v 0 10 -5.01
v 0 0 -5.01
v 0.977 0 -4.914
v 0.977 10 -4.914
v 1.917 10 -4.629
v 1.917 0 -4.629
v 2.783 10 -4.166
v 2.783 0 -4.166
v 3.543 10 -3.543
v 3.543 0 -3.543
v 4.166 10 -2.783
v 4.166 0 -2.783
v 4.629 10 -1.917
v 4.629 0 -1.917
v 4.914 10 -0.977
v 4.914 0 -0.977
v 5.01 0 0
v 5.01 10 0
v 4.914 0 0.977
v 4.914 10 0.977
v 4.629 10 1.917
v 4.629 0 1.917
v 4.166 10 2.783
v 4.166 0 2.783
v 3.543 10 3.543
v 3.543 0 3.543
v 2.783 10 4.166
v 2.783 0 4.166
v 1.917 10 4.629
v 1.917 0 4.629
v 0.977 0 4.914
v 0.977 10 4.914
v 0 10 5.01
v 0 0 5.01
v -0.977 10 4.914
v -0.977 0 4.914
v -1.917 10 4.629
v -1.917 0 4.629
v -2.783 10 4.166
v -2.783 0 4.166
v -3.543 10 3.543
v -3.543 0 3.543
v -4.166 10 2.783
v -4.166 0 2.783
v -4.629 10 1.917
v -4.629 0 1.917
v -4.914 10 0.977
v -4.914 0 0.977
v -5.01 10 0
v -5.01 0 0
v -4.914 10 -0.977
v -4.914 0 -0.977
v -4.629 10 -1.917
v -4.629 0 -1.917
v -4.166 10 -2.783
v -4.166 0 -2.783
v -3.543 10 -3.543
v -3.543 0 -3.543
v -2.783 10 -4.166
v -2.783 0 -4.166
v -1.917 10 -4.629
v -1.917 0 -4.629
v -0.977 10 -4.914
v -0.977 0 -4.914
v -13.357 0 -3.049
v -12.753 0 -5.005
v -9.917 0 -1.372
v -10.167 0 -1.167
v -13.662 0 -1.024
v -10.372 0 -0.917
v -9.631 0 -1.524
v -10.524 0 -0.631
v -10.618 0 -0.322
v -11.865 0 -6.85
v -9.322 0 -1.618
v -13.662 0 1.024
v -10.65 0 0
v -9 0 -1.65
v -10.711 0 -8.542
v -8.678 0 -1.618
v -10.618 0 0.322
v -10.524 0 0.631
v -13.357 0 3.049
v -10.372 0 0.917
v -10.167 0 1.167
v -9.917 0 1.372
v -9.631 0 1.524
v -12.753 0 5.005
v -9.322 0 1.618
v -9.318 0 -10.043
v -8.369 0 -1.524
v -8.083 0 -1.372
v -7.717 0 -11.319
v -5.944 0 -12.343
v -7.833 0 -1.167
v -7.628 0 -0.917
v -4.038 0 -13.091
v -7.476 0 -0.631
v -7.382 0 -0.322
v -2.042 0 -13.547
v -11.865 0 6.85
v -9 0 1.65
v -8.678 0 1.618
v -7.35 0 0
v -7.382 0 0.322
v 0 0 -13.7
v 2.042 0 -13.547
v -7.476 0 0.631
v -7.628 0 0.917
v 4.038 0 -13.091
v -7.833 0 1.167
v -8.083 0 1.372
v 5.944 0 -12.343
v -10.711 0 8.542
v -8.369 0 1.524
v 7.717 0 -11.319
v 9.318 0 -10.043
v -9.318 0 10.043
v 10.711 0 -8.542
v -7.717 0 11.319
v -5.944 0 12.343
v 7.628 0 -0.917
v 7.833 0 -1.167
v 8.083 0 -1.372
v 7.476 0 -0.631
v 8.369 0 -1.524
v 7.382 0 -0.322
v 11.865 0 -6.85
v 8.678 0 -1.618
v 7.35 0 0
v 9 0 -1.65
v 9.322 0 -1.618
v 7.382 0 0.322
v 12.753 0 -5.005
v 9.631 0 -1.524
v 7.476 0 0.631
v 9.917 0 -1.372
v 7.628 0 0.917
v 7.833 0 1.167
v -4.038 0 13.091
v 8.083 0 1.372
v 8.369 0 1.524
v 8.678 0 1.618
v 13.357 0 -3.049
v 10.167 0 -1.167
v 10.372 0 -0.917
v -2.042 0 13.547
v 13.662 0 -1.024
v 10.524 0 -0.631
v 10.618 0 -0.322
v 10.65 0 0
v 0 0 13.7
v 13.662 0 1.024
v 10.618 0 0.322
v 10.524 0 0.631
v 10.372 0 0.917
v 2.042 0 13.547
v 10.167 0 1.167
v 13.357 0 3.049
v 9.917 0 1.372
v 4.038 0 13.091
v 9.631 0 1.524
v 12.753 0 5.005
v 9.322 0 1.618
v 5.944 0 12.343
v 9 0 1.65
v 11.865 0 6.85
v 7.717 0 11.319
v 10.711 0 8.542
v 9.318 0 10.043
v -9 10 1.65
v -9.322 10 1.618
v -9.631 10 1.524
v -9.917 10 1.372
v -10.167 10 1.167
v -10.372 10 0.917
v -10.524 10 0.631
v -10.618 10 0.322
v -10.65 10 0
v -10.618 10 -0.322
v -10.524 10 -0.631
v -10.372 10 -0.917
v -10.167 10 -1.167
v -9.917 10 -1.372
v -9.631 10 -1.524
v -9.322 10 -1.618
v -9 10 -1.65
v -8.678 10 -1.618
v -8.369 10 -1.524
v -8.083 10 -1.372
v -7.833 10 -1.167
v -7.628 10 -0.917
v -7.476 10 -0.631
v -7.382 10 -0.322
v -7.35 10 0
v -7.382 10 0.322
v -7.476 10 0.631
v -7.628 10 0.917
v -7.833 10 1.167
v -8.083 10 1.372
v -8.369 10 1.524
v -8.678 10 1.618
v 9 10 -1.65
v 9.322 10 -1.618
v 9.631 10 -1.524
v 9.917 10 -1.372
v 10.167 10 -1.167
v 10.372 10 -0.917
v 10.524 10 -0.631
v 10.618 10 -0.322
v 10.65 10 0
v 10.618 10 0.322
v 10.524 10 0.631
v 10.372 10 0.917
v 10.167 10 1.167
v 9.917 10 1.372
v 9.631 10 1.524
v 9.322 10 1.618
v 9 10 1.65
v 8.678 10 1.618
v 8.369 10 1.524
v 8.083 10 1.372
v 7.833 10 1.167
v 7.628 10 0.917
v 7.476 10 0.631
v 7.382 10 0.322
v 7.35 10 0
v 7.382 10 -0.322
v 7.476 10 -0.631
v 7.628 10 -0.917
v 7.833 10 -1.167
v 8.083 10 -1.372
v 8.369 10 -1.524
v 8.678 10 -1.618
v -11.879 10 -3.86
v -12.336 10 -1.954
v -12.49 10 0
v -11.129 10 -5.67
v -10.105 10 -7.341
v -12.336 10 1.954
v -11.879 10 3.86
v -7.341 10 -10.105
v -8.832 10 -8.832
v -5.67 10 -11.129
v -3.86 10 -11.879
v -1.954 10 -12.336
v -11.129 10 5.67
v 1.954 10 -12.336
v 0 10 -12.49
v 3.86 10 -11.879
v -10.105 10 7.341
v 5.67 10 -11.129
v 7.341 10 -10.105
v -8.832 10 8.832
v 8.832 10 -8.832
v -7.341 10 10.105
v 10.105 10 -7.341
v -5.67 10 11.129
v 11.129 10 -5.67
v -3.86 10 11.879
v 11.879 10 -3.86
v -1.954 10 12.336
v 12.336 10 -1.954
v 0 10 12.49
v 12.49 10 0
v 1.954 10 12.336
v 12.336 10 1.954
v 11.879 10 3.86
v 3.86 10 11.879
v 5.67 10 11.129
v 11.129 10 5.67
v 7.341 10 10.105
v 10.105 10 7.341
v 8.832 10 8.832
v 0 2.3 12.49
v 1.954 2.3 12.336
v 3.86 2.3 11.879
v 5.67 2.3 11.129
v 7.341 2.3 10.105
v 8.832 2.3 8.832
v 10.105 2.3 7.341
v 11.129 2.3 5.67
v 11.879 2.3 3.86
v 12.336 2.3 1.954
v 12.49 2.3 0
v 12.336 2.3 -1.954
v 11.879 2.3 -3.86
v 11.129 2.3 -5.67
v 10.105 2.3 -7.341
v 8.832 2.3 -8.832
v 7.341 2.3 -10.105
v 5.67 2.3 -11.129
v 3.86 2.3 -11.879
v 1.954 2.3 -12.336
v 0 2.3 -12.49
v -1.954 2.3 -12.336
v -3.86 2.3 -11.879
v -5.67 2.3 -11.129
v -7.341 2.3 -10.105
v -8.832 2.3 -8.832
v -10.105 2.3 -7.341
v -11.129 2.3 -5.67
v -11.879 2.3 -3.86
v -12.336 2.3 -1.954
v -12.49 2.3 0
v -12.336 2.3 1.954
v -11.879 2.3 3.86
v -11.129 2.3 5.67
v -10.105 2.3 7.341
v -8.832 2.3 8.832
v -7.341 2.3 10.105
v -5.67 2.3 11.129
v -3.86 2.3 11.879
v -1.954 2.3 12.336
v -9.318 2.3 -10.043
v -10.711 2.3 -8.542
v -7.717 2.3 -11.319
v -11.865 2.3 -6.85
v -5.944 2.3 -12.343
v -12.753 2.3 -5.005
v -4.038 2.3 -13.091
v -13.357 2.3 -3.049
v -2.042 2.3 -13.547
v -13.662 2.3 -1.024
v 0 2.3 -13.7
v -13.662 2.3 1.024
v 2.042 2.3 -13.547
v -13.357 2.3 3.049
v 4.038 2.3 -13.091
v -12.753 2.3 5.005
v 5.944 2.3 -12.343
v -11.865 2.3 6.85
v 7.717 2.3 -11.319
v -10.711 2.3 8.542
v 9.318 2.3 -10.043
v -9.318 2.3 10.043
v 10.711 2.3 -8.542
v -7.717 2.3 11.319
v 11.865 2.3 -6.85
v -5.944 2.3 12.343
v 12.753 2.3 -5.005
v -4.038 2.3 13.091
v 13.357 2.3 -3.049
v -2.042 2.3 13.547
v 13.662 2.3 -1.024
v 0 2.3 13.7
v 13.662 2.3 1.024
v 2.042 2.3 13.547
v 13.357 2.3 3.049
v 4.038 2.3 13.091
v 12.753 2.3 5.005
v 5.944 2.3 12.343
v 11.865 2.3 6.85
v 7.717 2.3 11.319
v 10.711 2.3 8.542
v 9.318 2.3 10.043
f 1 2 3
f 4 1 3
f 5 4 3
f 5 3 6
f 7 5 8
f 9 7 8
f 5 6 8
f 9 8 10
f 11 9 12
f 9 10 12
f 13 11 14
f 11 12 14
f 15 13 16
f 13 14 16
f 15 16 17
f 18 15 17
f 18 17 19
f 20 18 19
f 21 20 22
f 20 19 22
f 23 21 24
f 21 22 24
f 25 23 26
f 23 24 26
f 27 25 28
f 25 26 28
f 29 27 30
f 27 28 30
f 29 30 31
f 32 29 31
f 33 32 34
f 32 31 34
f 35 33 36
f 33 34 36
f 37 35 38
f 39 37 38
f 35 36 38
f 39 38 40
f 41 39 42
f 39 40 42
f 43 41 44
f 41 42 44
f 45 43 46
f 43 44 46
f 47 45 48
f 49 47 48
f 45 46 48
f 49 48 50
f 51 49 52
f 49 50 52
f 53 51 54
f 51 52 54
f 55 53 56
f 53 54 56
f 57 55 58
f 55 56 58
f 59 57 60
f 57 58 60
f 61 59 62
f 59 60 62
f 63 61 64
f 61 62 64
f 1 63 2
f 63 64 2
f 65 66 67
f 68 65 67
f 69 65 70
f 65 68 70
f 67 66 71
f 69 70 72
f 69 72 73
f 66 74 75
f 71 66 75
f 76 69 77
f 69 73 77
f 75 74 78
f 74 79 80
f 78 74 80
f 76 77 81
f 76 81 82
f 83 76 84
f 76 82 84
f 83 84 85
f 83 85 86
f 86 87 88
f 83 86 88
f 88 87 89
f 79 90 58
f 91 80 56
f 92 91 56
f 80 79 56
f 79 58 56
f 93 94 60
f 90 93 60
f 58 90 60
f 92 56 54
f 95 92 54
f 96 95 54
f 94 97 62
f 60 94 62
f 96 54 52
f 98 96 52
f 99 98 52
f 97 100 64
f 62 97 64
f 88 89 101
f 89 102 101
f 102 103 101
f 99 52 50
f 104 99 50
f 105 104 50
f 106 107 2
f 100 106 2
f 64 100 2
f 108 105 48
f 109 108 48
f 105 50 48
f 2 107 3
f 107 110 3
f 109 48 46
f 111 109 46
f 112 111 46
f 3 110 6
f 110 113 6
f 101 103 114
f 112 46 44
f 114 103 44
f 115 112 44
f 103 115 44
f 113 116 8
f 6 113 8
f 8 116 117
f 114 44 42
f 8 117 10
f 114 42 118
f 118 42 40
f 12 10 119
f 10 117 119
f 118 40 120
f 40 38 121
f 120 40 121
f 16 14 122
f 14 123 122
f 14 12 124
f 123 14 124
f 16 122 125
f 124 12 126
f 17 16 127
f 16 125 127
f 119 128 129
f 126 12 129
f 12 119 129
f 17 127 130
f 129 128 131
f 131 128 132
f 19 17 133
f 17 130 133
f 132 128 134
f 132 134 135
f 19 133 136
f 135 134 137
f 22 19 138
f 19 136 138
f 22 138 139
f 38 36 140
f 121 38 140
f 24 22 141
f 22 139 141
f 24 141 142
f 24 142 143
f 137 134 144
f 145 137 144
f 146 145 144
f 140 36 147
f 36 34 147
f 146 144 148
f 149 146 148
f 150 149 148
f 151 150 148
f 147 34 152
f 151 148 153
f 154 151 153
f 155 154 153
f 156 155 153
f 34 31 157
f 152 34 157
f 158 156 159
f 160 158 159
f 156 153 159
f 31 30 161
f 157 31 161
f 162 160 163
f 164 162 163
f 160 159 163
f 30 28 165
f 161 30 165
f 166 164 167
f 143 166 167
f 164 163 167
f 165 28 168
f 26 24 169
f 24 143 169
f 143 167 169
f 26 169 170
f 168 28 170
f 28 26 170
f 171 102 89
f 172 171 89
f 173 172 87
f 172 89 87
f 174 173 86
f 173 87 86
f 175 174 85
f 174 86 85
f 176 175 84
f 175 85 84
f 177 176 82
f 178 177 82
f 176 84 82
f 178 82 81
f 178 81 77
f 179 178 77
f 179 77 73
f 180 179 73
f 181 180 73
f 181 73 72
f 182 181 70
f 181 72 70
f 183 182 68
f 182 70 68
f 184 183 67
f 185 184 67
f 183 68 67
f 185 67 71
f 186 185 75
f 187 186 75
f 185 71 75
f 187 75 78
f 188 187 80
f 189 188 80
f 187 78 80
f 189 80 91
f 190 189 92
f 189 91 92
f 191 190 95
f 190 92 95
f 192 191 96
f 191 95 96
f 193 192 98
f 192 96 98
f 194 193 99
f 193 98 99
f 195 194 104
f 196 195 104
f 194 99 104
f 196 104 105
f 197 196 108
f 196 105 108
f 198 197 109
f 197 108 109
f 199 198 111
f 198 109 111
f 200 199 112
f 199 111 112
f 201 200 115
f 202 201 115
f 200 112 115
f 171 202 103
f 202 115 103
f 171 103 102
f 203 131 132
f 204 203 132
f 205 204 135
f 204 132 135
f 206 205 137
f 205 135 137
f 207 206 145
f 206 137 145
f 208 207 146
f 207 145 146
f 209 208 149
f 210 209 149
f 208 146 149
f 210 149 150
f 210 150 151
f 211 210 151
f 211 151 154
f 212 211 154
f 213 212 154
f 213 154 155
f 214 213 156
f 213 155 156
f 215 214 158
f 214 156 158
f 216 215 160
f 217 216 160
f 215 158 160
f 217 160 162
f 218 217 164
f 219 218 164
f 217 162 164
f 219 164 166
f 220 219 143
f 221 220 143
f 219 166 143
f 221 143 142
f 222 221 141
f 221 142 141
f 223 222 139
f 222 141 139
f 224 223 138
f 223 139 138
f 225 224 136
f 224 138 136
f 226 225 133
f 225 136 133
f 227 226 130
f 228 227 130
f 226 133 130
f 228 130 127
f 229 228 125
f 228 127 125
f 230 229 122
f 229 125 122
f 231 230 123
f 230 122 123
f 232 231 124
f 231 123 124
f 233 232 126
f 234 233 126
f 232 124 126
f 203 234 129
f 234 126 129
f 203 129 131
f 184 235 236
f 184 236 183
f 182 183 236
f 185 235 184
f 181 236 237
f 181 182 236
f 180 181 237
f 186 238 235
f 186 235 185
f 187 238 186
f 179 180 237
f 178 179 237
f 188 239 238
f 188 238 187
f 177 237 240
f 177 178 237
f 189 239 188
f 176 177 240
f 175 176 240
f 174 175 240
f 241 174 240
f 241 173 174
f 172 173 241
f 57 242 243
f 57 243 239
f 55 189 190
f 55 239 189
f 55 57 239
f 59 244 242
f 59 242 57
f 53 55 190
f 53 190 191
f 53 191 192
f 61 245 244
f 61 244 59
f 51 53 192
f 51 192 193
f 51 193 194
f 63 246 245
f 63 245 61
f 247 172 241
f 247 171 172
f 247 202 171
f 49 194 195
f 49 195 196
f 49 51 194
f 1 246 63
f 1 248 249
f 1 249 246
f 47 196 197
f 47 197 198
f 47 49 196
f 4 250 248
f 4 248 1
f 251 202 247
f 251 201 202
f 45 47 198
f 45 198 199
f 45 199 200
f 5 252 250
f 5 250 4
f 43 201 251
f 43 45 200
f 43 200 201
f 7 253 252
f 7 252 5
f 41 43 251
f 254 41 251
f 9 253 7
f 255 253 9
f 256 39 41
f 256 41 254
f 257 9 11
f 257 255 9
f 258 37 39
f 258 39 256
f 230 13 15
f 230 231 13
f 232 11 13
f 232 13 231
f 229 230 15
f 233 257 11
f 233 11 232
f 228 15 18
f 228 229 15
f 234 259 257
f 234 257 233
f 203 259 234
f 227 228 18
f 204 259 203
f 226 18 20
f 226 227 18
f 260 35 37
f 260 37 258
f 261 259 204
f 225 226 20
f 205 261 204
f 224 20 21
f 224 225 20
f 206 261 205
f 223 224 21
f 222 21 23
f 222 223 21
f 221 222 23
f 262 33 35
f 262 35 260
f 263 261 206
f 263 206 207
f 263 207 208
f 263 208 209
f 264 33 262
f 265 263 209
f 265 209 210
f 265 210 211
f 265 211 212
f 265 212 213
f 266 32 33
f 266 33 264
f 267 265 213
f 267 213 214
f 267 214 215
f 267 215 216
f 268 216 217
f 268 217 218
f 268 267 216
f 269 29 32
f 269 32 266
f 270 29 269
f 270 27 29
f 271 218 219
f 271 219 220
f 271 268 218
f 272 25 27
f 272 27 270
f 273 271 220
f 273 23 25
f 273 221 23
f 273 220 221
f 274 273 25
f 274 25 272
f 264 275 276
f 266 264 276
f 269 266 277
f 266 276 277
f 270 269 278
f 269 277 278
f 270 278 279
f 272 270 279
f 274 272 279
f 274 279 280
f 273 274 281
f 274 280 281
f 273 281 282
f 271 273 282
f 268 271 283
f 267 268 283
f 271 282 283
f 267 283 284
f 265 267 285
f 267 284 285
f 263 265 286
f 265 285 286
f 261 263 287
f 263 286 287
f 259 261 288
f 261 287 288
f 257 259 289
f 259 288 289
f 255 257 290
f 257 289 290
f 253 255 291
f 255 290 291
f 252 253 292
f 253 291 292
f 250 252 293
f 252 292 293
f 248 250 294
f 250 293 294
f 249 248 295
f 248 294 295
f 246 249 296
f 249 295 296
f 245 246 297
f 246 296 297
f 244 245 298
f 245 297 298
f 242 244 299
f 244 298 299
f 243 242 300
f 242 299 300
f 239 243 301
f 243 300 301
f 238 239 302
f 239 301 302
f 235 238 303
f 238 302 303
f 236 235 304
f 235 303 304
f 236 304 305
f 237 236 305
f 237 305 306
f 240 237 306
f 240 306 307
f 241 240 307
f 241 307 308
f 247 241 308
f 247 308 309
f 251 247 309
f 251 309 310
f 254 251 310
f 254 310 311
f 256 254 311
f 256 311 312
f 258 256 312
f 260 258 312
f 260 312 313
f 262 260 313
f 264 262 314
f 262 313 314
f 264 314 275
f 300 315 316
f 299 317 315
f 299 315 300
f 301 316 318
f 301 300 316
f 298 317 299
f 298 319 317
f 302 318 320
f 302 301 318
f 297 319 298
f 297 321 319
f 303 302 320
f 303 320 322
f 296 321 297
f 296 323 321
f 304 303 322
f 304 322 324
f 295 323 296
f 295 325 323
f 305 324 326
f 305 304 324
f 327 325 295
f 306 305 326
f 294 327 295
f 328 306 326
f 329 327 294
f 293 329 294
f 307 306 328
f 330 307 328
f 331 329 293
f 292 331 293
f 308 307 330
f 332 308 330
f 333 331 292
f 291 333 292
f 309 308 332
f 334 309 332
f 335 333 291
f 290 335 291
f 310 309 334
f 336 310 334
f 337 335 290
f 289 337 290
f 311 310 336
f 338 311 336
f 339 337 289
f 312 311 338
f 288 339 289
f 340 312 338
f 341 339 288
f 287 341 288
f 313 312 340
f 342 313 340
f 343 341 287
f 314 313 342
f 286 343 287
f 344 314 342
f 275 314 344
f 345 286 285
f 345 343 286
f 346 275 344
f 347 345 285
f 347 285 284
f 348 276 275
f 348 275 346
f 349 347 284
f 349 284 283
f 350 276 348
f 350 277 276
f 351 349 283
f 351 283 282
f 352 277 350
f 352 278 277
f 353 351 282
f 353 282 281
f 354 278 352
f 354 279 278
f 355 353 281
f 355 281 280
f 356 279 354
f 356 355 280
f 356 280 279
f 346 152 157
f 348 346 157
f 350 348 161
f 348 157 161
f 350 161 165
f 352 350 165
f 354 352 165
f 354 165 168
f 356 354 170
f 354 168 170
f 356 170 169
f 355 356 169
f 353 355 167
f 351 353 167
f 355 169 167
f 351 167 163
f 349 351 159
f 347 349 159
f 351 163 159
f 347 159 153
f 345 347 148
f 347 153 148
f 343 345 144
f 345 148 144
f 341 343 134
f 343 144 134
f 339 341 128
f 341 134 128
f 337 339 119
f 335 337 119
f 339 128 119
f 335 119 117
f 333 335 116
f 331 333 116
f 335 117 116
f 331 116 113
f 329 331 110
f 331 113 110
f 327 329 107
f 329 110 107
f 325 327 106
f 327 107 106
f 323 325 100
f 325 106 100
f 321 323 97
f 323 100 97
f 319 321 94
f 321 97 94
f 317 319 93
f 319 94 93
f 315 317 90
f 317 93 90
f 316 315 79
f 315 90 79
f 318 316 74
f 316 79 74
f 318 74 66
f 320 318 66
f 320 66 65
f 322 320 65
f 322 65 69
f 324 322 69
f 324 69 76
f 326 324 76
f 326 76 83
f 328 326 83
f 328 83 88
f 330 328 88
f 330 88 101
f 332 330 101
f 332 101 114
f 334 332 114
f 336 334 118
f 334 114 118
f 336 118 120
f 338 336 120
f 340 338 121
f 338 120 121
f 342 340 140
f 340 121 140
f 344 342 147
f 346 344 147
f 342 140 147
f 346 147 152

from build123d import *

# Parameters (mm, degrees)
SKETCH_1_R          = 13.7
EXTRUDE_1_DEPTH     = 2.3
SKETCH_2_R          = 12.49
EXTRUDE_2_DEPTH     = 7.7
SKETCH_3_R          = 5.01
SKETCH_3_R_2        = 1.65
CUT_EXTRUDE_1_DEPTH = 10


with BuildPart() as part:
    # ｽｹｯﾁ1 → ﾎﾞｽ - 押し出し1 (new body)
    with BuildSketch(Plane(origin=(0, 0, 0), x_dir=(1, 0, 0), z_dir=(0, 1, 0))):
        with Locations(Location((0, 0, 0), (0, 0, 270))):
            Circle(SKETCH_1_R)
    extrude(amount=EXTRUDE_1_DEPTH)

    # ｽｹｯﾁ2 → ﾎﾞｽ - 押し出し2 (add)
    with BuildSketch(Plane(origin=(0, 2.3, 0), x_dir=(1, 0, 0), z_dir=(0, 1, 0))):
        with Locations(Location((0, 0, 0), (0, 0, 270))):
            Circle(SKETCH_2_R)
    extrude(amount=EXTRUDE_2_DEPTH)

    # ｽｹｯﾁ3 → ｶｯﾄ - 押し出し1 (cut)
    with BuildSketch(Plane.XZ):
        with Locations(Location((0, 0, 0), (0, 0, 270))):
            Circle(SKETCH_3_R)
        with Locations(Location((9, 0, 0), (0, 0, 270))):
            Circle(SKETCH_3_R_2)
        with Locations(Location((-9, 0, 0), (0, 0, 90))):
            Circle(SKETCH_3_R_2)
    extrude(amount=-CUT_EXTRUDE_1_DEPTH, mode=Mode.SUBTRACT)


solid = part.part
